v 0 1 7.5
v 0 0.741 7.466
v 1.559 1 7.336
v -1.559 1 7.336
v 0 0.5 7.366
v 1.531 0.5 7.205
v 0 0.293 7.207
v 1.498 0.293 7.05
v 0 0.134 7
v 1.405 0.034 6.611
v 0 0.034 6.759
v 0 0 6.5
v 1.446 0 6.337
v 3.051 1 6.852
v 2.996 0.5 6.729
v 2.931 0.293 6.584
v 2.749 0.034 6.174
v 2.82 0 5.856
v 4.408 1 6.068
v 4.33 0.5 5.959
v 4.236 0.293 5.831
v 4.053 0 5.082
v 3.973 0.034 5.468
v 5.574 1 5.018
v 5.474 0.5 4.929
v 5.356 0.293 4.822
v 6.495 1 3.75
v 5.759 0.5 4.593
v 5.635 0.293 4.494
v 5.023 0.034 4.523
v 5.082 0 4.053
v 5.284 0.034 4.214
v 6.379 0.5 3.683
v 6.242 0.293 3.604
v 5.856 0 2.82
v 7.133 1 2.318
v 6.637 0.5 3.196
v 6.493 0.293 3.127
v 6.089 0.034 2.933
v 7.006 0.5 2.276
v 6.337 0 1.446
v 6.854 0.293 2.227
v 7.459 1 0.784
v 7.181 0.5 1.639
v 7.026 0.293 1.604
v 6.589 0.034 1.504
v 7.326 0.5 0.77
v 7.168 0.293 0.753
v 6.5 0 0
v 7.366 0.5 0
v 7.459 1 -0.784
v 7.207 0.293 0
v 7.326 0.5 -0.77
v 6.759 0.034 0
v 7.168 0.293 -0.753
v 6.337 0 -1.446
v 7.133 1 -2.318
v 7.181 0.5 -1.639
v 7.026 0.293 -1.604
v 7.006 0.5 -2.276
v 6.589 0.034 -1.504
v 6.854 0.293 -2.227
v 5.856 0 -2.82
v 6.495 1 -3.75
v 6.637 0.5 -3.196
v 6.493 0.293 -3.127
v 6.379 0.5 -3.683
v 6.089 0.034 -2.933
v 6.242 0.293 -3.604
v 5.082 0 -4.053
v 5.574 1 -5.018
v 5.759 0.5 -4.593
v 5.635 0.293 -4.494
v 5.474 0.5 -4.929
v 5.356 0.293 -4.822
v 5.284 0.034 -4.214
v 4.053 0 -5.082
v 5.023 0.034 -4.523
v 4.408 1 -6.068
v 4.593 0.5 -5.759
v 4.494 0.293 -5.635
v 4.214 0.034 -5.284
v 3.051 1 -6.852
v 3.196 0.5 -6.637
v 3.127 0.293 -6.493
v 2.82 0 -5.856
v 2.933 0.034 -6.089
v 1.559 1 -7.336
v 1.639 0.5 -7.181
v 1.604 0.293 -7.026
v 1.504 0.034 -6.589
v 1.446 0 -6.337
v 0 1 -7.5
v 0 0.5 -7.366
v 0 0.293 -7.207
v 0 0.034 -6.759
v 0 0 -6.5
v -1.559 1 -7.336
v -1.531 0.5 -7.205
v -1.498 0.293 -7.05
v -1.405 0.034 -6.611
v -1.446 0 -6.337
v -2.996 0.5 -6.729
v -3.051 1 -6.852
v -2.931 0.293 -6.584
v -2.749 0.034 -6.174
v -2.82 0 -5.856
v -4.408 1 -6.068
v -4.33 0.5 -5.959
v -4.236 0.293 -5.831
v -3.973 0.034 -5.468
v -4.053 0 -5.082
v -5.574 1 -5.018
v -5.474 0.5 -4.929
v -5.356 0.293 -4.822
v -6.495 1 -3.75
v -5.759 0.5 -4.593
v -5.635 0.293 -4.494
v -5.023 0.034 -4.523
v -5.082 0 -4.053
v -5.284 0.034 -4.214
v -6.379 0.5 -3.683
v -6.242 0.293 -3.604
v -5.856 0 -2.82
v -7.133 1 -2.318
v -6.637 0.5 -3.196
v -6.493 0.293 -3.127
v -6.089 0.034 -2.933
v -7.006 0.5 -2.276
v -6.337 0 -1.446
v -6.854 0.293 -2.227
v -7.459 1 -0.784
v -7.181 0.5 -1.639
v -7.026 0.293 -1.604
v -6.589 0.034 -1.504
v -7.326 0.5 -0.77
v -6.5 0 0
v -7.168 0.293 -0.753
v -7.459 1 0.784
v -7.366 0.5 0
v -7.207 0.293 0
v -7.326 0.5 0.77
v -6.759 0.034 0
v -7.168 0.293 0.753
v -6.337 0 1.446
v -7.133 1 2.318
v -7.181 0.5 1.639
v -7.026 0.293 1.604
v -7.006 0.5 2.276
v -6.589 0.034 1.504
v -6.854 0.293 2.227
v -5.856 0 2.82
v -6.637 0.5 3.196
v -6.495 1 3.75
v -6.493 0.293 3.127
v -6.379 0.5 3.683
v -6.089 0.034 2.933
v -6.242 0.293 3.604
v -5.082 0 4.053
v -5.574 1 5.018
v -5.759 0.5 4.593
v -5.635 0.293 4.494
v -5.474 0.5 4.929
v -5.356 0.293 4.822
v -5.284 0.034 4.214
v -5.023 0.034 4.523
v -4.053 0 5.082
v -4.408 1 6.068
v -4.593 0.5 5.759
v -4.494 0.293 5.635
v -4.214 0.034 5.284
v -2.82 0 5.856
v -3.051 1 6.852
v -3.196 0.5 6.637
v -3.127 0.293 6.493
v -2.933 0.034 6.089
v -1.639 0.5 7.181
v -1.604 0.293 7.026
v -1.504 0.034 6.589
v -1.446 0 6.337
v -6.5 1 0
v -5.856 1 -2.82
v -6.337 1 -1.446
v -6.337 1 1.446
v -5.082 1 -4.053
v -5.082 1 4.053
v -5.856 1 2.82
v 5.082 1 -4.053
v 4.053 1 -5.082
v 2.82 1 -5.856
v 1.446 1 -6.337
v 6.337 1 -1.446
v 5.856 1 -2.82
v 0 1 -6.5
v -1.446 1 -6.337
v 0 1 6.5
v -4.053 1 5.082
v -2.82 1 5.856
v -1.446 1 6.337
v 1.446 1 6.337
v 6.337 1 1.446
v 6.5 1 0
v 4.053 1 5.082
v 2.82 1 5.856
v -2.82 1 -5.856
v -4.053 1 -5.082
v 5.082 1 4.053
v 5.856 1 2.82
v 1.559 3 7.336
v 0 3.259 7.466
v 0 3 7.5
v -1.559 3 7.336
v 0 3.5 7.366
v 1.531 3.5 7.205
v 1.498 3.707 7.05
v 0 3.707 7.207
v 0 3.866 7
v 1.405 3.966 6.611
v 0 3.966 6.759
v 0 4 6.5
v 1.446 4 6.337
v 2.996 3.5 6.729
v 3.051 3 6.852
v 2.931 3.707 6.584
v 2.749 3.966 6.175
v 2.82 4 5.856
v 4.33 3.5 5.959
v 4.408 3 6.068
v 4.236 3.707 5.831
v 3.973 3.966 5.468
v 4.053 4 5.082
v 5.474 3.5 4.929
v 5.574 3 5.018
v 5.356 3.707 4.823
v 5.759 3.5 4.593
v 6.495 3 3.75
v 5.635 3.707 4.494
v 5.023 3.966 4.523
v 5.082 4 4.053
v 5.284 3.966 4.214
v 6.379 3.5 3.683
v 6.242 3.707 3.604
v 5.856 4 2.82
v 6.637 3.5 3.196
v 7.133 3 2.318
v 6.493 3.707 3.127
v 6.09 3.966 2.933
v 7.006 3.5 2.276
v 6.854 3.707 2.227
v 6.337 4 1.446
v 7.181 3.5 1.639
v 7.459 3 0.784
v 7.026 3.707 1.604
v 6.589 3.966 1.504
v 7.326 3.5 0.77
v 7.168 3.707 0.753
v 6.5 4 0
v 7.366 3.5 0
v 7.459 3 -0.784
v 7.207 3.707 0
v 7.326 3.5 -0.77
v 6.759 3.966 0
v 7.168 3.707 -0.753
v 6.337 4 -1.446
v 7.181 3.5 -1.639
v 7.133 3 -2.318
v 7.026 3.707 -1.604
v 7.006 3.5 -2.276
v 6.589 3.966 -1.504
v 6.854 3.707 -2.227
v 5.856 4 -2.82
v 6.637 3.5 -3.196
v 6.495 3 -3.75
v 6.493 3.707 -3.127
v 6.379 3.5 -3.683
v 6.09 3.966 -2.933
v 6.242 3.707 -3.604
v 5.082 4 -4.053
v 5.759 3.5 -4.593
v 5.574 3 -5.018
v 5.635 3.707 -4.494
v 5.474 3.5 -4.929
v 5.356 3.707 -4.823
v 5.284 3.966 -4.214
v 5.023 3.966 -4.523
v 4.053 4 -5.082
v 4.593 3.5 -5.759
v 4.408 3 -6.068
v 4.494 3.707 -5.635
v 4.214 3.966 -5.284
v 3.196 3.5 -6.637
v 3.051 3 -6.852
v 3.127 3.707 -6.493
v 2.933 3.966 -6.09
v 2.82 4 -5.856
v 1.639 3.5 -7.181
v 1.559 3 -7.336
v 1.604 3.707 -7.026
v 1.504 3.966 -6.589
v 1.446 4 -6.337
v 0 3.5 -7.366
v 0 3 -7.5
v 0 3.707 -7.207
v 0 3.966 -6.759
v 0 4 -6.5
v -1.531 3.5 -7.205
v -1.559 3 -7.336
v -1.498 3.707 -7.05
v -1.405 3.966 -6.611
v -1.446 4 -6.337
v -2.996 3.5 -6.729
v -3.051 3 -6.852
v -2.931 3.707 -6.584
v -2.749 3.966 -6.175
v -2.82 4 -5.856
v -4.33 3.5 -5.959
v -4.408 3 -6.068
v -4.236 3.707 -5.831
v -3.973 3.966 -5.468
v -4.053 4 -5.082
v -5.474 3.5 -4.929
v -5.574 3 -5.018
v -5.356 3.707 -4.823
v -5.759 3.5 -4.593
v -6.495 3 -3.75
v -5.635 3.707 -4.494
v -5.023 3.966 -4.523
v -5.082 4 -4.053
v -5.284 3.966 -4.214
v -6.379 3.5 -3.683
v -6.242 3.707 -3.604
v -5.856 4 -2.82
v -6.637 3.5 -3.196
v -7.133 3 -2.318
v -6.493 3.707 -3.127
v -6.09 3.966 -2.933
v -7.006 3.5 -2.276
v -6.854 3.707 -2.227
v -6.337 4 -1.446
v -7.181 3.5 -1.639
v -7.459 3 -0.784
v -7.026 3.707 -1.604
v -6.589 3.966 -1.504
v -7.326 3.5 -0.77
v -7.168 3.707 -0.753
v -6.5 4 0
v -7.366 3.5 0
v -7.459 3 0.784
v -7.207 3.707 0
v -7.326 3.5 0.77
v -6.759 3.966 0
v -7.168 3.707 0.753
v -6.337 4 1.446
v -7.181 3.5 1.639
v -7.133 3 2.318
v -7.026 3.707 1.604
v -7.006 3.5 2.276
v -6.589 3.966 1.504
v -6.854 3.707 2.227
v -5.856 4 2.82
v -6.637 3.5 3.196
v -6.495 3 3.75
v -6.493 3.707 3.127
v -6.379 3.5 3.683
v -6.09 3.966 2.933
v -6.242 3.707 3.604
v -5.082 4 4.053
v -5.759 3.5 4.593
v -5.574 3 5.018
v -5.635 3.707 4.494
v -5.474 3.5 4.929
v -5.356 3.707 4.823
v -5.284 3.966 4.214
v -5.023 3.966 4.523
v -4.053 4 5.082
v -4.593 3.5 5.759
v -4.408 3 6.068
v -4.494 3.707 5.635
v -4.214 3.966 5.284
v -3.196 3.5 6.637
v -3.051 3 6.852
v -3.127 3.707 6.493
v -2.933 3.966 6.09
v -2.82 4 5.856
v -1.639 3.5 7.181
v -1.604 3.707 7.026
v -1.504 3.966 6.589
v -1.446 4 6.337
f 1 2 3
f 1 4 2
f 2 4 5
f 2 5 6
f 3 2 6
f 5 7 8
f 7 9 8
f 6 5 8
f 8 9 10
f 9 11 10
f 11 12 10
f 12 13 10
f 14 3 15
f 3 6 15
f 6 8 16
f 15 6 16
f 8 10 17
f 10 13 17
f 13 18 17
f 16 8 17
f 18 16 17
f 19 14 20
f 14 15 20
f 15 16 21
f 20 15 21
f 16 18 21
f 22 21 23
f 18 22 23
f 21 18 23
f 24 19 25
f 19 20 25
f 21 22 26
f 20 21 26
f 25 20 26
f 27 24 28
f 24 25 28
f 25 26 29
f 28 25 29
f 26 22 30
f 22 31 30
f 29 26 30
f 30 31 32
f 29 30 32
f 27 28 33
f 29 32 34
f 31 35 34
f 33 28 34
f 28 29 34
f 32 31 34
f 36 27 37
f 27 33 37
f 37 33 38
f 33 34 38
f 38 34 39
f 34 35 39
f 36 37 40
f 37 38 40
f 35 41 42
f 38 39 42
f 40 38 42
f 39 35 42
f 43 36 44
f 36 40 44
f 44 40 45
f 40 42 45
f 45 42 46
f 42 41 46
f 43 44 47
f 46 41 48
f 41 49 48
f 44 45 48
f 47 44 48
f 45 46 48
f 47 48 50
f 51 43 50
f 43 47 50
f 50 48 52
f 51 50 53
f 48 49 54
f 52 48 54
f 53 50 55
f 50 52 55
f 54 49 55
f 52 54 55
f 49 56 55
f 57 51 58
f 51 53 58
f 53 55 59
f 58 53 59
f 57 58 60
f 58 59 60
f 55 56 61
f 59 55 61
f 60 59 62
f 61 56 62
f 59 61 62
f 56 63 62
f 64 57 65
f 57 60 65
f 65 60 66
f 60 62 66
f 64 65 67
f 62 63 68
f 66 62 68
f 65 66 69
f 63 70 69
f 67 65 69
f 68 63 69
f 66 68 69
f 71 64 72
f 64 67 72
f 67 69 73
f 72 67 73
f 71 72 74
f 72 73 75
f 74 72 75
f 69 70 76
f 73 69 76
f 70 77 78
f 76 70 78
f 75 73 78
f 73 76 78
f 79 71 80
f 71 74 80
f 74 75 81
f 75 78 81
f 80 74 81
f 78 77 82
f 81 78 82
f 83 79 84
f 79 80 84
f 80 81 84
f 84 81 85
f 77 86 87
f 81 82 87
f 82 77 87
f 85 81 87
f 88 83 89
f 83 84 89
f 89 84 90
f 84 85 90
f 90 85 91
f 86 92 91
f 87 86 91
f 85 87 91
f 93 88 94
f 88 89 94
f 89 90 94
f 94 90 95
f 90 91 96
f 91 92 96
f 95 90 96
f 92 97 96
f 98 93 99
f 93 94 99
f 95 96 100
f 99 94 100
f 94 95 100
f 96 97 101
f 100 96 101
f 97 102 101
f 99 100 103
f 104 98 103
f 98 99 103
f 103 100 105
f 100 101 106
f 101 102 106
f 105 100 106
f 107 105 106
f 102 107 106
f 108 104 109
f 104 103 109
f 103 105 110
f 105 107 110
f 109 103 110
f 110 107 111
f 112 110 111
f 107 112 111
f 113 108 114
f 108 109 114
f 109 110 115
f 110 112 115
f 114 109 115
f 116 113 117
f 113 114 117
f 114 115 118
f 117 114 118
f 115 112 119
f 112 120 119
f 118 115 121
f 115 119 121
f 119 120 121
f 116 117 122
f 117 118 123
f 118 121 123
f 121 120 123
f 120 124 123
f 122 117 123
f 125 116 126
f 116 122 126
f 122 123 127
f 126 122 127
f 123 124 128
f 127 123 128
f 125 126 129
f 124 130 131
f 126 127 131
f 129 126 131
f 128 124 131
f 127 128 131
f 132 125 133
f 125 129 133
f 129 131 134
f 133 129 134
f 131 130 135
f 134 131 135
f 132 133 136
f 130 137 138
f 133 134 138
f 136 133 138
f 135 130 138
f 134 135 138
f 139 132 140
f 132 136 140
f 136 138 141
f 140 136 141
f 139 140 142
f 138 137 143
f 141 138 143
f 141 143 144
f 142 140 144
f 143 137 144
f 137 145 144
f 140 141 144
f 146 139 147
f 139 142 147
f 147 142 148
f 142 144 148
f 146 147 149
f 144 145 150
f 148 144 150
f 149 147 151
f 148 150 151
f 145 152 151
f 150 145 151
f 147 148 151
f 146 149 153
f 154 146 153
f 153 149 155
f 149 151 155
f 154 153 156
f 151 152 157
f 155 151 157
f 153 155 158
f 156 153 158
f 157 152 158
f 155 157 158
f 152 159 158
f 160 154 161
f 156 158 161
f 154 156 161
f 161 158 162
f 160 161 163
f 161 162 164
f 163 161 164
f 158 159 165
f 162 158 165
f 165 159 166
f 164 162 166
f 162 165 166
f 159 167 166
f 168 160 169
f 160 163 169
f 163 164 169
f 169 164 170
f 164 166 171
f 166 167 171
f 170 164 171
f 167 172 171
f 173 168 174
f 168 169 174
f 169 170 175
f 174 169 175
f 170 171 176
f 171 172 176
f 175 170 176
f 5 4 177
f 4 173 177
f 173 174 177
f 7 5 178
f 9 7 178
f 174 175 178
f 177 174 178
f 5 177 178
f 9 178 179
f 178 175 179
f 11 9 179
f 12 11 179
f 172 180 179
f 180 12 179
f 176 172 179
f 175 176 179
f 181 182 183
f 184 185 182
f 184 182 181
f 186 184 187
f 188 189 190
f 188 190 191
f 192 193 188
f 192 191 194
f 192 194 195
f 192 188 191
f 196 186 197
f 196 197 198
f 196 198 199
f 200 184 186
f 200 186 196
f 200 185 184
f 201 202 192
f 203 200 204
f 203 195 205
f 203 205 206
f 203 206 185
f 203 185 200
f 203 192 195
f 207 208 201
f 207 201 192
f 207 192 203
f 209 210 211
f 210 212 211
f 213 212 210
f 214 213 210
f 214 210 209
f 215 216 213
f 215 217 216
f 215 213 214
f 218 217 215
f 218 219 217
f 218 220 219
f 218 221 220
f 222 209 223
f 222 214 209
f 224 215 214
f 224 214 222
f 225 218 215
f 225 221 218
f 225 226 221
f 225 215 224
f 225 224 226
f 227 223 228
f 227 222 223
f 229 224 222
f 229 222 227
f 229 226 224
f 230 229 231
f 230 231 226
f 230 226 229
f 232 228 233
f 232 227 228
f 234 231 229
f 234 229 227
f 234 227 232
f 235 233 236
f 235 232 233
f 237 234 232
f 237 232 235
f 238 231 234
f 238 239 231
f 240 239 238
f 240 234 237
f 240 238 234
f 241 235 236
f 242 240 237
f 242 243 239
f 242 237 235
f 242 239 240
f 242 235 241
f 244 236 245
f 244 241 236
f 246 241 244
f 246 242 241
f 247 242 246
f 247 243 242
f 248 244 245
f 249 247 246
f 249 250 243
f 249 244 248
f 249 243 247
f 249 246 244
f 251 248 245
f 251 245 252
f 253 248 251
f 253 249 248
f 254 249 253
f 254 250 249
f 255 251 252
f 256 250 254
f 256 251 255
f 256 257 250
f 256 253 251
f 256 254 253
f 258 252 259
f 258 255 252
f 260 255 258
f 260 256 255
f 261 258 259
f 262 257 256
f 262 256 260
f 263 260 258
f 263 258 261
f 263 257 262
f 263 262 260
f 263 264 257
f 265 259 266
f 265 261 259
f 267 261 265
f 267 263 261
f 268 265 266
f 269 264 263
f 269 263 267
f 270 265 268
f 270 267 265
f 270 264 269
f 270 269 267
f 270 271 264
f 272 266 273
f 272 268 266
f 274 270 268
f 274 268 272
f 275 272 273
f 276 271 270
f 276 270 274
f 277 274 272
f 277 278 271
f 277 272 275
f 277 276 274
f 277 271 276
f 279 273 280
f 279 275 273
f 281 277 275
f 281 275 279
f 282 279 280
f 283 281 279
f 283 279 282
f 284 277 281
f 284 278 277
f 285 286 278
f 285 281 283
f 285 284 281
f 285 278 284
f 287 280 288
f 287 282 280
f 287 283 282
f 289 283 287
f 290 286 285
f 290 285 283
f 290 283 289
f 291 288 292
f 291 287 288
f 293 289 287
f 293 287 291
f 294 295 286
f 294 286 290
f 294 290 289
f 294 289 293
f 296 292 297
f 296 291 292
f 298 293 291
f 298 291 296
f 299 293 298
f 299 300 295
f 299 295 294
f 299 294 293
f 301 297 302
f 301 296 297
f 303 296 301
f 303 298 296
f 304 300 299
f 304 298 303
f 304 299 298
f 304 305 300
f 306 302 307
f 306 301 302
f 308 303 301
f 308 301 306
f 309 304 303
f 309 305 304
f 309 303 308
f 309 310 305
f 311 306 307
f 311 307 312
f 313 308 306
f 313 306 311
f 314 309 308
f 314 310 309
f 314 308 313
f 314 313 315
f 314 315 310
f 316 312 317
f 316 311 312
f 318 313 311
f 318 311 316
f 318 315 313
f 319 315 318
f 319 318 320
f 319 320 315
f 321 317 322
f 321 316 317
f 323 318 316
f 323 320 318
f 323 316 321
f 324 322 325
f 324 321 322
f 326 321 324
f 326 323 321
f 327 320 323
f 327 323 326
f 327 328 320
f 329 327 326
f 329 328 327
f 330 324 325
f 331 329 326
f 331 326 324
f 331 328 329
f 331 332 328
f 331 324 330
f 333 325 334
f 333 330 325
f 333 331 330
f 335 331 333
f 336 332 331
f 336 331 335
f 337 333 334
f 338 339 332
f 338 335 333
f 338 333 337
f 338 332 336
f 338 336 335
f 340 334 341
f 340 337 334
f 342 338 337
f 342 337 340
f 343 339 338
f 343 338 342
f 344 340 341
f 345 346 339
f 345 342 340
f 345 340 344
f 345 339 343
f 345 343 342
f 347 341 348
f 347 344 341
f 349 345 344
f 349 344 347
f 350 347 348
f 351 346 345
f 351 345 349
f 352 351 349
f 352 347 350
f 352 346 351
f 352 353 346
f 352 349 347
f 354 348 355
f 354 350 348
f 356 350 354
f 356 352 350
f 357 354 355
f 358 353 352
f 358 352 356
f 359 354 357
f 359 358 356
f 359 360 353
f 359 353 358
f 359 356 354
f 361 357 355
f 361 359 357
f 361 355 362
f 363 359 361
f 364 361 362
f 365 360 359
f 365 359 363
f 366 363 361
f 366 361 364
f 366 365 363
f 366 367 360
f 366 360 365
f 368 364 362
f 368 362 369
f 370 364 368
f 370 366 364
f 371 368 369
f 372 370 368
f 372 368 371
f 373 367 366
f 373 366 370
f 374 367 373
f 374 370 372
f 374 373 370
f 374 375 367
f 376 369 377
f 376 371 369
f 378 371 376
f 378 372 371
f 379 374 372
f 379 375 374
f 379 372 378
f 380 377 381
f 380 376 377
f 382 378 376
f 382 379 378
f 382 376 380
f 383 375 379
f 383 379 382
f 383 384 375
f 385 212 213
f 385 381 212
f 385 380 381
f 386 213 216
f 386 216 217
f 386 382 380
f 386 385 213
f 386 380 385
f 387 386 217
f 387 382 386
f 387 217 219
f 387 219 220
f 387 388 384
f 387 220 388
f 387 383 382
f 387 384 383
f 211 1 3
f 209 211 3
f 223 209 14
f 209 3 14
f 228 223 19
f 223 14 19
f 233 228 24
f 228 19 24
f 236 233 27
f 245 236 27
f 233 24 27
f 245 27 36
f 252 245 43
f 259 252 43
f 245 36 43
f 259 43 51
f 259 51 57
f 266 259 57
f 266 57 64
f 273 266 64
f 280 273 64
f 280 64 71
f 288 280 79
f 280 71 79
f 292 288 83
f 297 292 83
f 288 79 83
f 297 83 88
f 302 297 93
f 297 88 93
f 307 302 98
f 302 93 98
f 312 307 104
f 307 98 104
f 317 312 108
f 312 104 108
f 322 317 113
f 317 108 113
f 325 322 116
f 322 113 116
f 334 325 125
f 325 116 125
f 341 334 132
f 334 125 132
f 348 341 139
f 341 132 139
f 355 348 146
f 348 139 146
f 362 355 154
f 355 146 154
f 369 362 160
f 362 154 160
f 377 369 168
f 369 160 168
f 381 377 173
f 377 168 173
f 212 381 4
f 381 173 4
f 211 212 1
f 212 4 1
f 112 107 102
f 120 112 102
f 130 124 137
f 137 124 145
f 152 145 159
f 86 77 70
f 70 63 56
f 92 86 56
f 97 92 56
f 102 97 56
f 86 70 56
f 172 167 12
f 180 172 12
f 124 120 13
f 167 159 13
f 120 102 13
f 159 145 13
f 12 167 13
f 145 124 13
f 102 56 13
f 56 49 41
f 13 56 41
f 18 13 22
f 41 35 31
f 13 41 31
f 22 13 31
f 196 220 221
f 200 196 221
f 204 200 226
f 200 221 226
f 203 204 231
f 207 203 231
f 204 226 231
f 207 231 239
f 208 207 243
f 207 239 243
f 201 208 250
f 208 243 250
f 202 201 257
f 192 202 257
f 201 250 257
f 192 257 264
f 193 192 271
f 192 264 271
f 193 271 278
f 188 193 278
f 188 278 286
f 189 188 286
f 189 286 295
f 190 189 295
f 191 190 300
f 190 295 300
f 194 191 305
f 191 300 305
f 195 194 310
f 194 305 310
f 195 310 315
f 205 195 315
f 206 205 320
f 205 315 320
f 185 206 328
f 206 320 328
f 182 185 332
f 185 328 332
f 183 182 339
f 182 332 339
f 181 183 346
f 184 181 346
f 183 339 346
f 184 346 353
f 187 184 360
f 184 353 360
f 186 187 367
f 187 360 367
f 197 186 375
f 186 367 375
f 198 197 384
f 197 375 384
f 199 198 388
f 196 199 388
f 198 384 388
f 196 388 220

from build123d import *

# Parameters (mm, degrees)
SKETCH1_R           = 7.5
BOSS_EXTRUDE1_DEPTH = 4
SKETCH2_R           = 6.5
CUT_EXTRUDE1_DEPTH  = 3
FILLET1_R           = 1
FILLET2_R           = 1


with BuildPart() as part:
    # Sketch1 → Boss-Extrude1 (new body)
    with BuildSketch(Plane(origin=(0, 0, 0), x_dir=(1, 0, 0), z_dir=(0, 1, 0))):
        with Locations(Location((0, 0, 0), (0, 0, 270))):
            Circle(SKETCH1_R)
    extrude(amount=BOSS_EXTRUDE1_DEPTH)

    # Sketch2 → Cut-Extrude1 (cut)
    with BuildSketch(Plane(origin=(0, 4, 0), x_dir=(1, 0, 0), z_dir=(0, 1, 0))):
        with Locations(Location((0, 0, 0), (0, 0, 270))):
            Circle(SKETCH2_R)
    extrude(amount=-CUT_EXTRUDE1_DEPTH, mode=Mode.SUBTRACT)

    # Fillet1
    fillet1_edges = [part.edges().sort_by_distance(p)[0] for p in [
        (0, 4, -7.5),
    ]]
    fillet(fillet1_edges, radius=FILLET1_R - 0.0001)  # a hair under: the kernel refuses the full size

    # Fillet2
    fillet2_edges = [part.edges().sort_by_distance(p)[0] for p in [
        (0, 0, -7.5),
    ]]
    fillet(fillet2_edges, radius=FILLET2_R)


solid = part.part
